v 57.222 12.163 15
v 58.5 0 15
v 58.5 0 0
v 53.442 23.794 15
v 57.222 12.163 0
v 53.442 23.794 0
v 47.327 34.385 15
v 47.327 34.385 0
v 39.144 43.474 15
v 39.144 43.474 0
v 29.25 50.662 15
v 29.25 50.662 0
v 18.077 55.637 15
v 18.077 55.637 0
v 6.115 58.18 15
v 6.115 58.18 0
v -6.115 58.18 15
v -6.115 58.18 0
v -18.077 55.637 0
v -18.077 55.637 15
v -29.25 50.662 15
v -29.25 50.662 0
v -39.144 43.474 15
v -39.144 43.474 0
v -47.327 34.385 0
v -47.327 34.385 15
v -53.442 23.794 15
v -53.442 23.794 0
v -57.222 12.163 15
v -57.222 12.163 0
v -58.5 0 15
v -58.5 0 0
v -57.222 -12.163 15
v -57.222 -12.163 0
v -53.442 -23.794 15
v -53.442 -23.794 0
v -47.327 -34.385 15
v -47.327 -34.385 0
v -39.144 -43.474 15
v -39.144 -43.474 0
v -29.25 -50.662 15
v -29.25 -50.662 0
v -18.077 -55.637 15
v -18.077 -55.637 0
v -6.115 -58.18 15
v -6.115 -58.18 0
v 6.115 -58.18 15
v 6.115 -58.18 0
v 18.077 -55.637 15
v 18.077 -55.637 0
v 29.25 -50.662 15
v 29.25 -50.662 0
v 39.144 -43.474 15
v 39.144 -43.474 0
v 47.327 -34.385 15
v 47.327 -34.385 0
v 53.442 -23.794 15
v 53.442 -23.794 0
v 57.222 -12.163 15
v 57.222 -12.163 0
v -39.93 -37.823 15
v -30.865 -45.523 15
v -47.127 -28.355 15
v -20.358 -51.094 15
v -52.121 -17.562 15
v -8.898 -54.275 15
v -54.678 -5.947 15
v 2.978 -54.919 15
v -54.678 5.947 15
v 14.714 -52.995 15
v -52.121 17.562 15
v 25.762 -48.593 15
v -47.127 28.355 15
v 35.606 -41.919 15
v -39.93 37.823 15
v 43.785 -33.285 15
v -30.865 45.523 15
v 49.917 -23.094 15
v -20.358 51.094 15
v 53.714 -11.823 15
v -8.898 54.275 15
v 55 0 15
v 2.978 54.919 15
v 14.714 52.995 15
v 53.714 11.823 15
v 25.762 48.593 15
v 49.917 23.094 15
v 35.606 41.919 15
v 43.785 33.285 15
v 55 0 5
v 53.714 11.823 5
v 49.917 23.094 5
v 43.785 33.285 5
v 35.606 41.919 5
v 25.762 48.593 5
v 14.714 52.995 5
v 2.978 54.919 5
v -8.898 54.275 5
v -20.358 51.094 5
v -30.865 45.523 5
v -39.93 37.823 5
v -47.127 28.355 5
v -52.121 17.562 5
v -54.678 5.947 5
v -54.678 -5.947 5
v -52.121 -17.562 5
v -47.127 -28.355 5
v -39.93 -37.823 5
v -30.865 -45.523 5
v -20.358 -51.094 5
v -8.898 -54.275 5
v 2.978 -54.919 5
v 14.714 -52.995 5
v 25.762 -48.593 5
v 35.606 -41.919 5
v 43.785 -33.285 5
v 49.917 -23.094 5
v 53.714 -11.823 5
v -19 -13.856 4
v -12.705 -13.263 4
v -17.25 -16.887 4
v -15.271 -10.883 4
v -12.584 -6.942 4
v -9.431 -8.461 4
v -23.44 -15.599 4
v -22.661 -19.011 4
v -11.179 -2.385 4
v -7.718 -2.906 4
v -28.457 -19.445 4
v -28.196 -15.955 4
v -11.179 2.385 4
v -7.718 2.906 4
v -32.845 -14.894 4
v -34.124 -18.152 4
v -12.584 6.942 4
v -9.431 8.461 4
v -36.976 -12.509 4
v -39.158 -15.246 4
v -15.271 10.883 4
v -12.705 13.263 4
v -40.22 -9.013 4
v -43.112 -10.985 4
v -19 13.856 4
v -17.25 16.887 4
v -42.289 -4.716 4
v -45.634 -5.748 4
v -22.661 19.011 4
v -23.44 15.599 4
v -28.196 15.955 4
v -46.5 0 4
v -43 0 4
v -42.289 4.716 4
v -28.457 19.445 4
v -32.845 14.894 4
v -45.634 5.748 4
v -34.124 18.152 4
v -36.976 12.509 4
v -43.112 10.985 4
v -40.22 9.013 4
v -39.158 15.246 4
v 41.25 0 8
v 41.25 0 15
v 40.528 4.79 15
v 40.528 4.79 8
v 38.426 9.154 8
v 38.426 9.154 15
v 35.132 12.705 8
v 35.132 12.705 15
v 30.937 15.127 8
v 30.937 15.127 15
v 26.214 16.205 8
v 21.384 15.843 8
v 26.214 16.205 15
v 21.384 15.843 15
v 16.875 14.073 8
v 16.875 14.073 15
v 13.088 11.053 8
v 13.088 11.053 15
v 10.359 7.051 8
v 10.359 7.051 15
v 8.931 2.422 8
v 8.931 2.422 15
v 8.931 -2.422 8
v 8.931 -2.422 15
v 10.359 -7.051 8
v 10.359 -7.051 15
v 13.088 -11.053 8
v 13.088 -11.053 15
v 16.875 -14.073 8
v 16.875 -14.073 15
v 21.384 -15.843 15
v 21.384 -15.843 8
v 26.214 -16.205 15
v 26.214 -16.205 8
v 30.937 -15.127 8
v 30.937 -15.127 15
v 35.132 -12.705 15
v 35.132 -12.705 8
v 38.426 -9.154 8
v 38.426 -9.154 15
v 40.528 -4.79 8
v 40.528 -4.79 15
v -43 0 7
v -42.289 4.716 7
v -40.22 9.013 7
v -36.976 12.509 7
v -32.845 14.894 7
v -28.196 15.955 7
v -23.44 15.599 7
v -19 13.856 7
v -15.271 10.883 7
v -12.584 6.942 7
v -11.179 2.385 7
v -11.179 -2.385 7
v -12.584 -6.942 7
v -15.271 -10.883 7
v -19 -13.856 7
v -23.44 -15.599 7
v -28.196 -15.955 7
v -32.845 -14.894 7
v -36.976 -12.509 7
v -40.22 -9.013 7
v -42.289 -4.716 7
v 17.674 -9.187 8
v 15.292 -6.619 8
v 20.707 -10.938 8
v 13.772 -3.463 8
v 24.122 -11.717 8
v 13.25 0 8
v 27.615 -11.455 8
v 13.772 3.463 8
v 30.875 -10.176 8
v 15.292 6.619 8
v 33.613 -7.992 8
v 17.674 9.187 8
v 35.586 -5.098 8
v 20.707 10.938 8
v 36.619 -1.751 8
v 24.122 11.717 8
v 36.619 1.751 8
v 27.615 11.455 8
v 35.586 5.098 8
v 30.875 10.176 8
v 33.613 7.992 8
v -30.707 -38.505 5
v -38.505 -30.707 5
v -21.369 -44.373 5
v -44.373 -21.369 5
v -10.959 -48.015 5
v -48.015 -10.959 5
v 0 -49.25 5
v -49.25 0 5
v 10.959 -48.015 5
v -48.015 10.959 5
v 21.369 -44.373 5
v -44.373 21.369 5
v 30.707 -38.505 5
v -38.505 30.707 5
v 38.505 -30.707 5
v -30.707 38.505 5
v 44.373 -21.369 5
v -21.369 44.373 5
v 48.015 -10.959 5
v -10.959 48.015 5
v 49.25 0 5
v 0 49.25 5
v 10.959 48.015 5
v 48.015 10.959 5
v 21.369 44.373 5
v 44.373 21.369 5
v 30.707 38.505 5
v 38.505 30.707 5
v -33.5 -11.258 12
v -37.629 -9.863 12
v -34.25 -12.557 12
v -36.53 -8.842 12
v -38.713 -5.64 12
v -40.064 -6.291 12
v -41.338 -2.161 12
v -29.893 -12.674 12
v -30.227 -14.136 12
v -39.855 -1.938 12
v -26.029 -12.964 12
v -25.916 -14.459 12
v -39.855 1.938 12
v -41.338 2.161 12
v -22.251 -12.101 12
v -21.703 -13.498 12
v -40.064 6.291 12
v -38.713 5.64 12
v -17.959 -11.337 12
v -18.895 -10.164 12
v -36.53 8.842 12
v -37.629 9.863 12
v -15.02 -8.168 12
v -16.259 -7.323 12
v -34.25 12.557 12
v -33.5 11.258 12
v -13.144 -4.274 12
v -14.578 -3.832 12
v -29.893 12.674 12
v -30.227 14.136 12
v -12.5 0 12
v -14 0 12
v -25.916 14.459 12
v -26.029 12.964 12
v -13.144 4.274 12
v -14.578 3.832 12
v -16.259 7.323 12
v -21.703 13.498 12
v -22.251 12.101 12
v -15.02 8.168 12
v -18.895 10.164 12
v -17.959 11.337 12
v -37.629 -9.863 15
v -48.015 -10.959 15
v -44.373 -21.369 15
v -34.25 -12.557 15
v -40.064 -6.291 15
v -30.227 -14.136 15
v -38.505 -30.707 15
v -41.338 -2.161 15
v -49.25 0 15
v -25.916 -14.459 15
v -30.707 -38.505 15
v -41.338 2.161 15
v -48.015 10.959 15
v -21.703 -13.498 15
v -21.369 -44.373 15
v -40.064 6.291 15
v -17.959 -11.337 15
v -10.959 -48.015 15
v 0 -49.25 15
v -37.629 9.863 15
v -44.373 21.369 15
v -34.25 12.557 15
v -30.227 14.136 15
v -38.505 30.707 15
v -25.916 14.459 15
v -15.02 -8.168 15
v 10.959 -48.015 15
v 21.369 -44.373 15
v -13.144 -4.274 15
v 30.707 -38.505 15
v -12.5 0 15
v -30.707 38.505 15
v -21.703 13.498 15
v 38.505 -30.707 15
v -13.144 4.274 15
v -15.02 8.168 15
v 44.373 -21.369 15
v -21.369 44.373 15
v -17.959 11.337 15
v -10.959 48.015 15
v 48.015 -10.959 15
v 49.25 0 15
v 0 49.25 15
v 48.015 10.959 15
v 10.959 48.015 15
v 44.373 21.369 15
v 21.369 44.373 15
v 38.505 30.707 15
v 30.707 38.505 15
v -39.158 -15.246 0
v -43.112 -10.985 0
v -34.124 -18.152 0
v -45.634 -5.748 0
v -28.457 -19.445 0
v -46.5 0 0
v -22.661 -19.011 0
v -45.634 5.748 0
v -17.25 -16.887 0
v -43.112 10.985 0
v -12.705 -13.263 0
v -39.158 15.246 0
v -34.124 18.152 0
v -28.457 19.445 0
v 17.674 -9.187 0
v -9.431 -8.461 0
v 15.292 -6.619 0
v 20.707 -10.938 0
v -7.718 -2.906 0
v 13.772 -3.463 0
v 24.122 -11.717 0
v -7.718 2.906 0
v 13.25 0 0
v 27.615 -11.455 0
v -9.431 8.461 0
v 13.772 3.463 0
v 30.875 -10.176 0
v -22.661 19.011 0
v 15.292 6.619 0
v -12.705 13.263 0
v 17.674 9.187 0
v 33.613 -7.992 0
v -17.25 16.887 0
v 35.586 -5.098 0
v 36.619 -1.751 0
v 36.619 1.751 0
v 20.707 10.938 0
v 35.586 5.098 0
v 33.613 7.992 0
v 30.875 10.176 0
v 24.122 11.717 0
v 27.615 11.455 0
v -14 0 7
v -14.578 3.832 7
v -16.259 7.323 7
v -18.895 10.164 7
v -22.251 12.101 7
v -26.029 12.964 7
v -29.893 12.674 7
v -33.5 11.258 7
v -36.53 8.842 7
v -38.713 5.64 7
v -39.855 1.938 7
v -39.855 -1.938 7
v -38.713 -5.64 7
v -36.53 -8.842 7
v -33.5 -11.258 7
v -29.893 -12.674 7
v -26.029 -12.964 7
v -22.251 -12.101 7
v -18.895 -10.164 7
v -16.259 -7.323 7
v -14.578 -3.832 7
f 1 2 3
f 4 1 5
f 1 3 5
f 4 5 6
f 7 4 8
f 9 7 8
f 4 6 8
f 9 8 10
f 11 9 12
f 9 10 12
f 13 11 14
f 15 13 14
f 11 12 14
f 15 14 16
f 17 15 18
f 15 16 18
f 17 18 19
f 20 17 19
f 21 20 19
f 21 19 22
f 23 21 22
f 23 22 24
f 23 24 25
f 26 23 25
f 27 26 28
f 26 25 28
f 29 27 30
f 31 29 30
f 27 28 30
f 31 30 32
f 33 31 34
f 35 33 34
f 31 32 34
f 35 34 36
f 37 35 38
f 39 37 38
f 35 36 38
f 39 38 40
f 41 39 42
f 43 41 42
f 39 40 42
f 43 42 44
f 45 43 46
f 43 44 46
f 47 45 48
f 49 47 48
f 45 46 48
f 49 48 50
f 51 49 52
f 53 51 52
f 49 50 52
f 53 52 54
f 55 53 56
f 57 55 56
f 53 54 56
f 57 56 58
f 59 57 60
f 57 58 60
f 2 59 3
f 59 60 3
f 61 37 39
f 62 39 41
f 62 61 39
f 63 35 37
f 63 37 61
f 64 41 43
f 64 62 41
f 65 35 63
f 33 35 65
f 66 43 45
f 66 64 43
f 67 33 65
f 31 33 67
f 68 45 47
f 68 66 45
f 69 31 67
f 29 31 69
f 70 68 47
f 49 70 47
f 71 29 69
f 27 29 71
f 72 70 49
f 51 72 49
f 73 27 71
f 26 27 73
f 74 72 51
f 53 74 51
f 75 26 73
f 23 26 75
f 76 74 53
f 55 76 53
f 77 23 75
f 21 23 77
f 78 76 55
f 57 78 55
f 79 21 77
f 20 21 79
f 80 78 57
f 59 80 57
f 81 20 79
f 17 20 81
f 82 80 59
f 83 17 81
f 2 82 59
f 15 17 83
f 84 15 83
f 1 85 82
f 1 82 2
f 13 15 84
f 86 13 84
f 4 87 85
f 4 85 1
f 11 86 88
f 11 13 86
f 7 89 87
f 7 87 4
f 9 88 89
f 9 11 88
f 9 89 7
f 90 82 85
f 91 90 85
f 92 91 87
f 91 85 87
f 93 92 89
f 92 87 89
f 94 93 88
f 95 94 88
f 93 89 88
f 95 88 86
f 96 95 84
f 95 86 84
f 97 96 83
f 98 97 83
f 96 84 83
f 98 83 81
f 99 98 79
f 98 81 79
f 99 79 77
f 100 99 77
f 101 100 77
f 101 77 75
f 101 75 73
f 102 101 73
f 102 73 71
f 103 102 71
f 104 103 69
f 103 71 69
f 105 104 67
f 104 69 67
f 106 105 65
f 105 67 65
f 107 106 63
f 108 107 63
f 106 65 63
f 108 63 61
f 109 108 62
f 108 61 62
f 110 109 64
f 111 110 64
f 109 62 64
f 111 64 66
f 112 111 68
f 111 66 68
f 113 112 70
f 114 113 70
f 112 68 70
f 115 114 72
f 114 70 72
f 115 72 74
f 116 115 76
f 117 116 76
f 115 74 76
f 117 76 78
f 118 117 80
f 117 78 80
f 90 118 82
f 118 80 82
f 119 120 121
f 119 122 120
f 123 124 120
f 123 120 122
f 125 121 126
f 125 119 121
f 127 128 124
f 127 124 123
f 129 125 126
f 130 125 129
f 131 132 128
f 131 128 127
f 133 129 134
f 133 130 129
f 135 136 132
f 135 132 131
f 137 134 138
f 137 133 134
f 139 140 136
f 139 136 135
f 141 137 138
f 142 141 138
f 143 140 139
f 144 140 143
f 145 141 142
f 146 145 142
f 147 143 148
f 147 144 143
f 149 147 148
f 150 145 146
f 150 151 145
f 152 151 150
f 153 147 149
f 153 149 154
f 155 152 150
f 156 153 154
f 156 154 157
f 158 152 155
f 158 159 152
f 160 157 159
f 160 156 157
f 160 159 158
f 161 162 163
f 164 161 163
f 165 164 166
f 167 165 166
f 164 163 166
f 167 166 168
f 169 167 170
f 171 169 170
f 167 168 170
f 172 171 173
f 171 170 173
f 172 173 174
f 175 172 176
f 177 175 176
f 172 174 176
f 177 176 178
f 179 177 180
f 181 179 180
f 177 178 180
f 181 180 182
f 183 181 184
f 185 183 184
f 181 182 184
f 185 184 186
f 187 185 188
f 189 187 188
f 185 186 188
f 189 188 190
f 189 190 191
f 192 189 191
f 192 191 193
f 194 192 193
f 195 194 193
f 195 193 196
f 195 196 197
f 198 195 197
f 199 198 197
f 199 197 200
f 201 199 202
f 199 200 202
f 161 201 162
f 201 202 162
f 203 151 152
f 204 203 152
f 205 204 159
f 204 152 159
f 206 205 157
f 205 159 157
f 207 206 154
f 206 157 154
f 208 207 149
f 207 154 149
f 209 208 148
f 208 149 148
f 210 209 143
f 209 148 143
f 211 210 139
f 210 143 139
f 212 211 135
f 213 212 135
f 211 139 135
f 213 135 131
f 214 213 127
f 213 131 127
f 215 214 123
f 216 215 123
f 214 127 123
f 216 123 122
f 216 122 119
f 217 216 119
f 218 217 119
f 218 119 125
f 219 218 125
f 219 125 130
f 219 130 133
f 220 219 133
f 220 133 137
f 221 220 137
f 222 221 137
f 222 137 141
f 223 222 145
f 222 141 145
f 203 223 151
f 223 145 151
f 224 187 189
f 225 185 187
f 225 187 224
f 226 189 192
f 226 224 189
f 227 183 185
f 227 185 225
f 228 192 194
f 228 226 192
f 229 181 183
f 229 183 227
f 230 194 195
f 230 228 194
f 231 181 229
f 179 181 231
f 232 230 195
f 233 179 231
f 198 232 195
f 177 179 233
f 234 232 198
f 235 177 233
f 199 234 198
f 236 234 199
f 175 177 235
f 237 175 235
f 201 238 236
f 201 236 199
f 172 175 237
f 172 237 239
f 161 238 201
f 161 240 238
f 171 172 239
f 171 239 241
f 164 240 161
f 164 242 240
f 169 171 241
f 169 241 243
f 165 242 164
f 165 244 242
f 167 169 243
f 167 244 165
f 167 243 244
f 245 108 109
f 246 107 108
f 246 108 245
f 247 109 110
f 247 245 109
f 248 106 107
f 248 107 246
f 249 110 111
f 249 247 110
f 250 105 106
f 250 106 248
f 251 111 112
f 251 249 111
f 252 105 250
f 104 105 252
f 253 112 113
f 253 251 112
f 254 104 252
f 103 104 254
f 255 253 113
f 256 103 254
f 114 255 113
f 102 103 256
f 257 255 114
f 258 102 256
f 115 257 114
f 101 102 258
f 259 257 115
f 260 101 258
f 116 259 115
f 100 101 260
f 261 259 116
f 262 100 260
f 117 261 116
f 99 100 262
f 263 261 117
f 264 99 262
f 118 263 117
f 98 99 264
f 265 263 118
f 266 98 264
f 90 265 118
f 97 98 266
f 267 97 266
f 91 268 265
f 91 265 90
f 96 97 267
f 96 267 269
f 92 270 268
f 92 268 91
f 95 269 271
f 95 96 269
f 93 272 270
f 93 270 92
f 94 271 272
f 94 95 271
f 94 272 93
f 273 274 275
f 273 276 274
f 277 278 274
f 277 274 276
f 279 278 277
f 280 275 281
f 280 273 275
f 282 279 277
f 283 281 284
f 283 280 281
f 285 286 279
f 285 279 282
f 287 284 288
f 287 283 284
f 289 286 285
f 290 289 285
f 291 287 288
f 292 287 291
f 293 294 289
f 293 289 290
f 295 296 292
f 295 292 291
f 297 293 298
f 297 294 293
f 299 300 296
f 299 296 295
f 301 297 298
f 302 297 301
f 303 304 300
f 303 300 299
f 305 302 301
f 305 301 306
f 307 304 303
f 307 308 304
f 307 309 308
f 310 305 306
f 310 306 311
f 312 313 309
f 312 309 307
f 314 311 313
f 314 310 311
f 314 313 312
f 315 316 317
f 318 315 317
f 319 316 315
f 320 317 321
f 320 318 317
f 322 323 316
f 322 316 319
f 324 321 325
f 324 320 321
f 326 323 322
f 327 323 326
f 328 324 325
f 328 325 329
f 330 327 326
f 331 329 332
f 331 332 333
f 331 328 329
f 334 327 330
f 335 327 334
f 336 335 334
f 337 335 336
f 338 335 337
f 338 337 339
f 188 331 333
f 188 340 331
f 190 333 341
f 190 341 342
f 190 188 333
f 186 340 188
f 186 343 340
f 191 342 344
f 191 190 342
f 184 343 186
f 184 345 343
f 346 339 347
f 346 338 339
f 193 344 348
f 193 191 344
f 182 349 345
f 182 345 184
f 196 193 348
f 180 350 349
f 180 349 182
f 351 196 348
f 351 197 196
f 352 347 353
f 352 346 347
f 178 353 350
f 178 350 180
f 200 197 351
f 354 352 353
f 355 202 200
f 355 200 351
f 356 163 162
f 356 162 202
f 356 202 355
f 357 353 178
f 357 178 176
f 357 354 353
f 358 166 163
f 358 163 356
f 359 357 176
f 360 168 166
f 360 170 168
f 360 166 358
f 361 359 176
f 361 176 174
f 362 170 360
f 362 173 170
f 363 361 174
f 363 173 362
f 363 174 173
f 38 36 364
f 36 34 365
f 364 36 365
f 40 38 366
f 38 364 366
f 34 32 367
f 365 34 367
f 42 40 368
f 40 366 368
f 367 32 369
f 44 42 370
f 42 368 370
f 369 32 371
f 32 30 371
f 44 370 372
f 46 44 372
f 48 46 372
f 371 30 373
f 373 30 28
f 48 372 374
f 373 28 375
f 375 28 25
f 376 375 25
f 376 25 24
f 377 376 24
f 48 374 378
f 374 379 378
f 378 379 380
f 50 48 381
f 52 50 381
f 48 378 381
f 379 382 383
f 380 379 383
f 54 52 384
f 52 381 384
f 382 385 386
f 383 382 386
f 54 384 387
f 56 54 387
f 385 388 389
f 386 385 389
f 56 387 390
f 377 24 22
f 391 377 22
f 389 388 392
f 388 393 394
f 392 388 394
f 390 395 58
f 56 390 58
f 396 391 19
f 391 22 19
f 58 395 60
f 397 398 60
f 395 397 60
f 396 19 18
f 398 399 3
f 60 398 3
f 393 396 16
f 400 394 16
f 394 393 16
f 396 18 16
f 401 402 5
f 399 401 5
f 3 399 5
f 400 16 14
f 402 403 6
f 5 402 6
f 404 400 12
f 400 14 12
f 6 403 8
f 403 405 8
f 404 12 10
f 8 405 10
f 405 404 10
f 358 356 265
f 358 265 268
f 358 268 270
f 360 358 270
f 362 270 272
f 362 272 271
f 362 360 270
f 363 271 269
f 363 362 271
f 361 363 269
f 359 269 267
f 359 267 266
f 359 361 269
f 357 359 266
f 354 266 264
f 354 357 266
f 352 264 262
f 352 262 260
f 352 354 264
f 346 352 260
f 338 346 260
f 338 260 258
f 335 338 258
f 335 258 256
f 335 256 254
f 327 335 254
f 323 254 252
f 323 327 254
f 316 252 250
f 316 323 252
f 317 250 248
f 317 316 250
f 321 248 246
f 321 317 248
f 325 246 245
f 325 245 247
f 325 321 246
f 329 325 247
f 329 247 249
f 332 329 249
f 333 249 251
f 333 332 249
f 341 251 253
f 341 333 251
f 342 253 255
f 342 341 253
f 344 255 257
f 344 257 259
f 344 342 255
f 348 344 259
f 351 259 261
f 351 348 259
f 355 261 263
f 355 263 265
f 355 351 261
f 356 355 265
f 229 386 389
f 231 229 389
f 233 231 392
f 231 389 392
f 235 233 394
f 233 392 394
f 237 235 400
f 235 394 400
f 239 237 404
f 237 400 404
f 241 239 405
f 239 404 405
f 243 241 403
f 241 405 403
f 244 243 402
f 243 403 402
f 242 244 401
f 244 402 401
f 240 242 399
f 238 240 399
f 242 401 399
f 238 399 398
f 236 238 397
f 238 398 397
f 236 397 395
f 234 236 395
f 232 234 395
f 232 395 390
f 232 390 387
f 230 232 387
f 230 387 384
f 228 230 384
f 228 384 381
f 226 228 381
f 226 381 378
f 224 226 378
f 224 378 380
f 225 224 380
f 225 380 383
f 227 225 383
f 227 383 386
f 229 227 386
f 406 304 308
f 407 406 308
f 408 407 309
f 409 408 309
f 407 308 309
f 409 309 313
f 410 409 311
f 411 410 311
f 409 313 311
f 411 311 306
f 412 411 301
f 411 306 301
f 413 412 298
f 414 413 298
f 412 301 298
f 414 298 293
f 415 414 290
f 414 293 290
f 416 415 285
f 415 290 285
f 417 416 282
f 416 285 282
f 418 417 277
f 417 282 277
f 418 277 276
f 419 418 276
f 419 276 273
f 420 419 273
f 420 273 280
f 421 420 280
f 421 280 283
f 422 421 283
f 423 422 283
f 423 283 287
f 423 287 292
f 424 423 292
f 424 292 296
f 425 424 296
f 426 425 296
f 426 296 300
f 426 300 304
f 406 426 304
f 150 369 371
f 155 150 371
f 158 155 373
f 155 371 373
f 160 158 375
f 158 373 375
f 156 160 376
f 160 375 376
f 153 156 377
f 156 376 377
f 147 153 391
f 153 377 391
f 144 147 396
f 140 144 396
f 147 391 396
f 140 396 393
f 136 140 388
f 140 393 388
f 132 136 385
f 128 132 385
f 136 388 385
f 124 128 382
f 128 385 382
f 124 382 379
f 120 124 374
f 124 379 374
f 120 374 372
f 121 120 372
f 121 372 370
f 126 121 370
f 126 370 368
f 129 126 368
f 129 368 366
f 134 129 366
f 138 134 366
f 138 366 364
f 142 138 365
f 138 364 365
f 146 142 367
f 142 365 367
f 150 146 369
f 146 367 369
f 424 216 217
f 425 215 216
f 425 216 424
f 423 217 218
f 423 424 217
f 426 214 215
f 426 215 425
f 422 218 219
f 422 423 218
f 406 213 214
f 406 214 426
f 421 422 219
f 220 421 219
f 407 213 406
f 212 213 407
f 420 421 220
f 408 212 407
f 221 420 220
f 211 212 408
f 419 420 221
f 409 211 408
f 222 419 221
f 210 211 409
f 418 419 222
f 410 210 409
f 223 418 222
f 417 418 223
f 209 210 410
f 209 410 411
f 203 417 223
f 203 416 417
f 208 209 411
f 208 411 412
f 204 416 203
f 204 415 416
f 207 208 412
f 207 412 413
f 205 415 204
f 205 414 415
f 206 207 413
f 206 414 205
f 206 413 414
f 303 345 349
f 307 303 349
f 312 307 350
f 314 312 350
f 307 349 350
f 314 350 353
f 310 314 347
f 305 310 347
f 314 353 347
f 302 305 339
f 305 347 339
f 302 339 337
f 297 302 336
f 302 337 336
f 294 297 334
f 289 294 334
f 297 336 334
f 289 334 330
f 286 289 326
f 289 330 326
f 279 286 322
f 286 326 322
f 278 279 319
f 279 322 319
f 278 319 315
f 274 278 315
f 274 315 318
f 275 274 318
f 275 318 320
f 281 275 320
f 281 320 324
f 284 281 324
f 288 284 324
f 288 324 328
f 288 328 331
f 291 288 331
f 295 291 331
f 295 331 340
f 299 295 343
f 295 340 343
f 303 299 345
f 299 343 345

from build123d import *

# Parameters (mm, degrees)
SKETCH1_R           = 58.5
BOSS_EXTRUDE1_DEPTH = 15
SKETCH2_R           = 55
SKETCH2_R_2         = 49.25
CUT_EXTRUDE1_DEPTH  = 10
SKETCH3_R           = 11.75
CUT_EXTRUDE2_DEPTH  = 85.080318743
SKETCH4_R           = 16.25
CUT_EXTRUDE3_DEPTH  = 7
SKETCH5_R           = 19.5
CUT_EXTRUDE4_DEPTH  = 4
SKETCH6_R           = 16
CUT_EXTRUDE5_DEPTH  = 3
SKETCH7_R           = 14.5
CUT_EXTRUDE6_DEPTH  = 3
SKETCH8_R           = 13
CUT_EXTRUDE7_DEPTH  = 84.597248759


with BuildPart() as part:
    # Sketch1 → Boss-Extrude1 (new body)
    with BuildSketch(Plane.XY):
        Circle(SKETCH1_R)
    extrude(amount=BOSS_EXTRUDE1_DEPTH)

    # Sketch2 → Cut-Extrude1 (cut)
    with BuildSketch(Plane.XY.offset(15)):
        Circle(SKETCH2_R)
        Circle(SKETCH2_R_2, mode=Mode.SUBTRACT)
    extrude(amount=-CUT_EXTRUDE1_DEPTH, mode=Mode.SUBTRACT)

    # Sketch3 → Cut-Extrude2 (cut, through all)
    with BuildSketch(Plane(origin=(0, 0, 0), x_dir=(-1, 0, 0), z_dir=(0, 0, -1))):
        with Locations((-25, 0)):
            Circle(SKETCH3_R)
    extrude(amount=-CUT_EXTRUDE2_DEPTH, mode=Mode.SUBTRACT)

    # Sketch4 → Cut-Extrude3 (cut)
    with BuildSketch(Plane.XY.offset(15)):
        with Locations((25, 0)):
            Circle(SKETCH4_R)
    extrude(amount=-CUT_EXTRUDE3_DEPTH, mode=Mode.SUBTRACT)

    # Sketch5 → Cut-Extrude4 (cut)
    with BuildSketch(Plane(origin=(0, 0, 0), x_dir=(-1, 0, 0), z_dir=(0, 0, -1))):
        with Locations((27, 0)):
            Circle(SKETCH5_R)
    extrude(amount=-CUT_EXTRUDE4_DEPTH, mode=Mode.SUBTRACT)

    # Sketch6 → Cut-Extrude5 (cut)
    with BuildSketch(Plane(origin=(0, 0, 4), x_dir=(-1, 0, 0), z_dir=(0, 0, -1))):
        with Locations((27, 0)):
            Circle(SKETCH6_R)
    extrude(amount=-CUT_EXTRUDE5_DEPTH, mode=Mode.SUBTRACT)

    # Sketch7 → Cut-Extrude6 (cut)
    with BuildSketch(Plane.XY.offset(15)):
        with Locations((-27, 0)):
            Circle(SKETCH7_R)
    extrude(amount=-CUT_EXTRUDE6_DEPTH, mode=Mode.SUBTRACT)

    # Sketch8 → Cut-Extrude7 (cut, through all)
    with BuildSketch(Plane.XY.offset(12)):
        with Locations((-27, 0)):
            Circle(SKETCH8_R)
    extrude(amount=-CUT_EXTRUDE7_DEPTH, mode=Mode.SUBTRACT)


solid = part.part
